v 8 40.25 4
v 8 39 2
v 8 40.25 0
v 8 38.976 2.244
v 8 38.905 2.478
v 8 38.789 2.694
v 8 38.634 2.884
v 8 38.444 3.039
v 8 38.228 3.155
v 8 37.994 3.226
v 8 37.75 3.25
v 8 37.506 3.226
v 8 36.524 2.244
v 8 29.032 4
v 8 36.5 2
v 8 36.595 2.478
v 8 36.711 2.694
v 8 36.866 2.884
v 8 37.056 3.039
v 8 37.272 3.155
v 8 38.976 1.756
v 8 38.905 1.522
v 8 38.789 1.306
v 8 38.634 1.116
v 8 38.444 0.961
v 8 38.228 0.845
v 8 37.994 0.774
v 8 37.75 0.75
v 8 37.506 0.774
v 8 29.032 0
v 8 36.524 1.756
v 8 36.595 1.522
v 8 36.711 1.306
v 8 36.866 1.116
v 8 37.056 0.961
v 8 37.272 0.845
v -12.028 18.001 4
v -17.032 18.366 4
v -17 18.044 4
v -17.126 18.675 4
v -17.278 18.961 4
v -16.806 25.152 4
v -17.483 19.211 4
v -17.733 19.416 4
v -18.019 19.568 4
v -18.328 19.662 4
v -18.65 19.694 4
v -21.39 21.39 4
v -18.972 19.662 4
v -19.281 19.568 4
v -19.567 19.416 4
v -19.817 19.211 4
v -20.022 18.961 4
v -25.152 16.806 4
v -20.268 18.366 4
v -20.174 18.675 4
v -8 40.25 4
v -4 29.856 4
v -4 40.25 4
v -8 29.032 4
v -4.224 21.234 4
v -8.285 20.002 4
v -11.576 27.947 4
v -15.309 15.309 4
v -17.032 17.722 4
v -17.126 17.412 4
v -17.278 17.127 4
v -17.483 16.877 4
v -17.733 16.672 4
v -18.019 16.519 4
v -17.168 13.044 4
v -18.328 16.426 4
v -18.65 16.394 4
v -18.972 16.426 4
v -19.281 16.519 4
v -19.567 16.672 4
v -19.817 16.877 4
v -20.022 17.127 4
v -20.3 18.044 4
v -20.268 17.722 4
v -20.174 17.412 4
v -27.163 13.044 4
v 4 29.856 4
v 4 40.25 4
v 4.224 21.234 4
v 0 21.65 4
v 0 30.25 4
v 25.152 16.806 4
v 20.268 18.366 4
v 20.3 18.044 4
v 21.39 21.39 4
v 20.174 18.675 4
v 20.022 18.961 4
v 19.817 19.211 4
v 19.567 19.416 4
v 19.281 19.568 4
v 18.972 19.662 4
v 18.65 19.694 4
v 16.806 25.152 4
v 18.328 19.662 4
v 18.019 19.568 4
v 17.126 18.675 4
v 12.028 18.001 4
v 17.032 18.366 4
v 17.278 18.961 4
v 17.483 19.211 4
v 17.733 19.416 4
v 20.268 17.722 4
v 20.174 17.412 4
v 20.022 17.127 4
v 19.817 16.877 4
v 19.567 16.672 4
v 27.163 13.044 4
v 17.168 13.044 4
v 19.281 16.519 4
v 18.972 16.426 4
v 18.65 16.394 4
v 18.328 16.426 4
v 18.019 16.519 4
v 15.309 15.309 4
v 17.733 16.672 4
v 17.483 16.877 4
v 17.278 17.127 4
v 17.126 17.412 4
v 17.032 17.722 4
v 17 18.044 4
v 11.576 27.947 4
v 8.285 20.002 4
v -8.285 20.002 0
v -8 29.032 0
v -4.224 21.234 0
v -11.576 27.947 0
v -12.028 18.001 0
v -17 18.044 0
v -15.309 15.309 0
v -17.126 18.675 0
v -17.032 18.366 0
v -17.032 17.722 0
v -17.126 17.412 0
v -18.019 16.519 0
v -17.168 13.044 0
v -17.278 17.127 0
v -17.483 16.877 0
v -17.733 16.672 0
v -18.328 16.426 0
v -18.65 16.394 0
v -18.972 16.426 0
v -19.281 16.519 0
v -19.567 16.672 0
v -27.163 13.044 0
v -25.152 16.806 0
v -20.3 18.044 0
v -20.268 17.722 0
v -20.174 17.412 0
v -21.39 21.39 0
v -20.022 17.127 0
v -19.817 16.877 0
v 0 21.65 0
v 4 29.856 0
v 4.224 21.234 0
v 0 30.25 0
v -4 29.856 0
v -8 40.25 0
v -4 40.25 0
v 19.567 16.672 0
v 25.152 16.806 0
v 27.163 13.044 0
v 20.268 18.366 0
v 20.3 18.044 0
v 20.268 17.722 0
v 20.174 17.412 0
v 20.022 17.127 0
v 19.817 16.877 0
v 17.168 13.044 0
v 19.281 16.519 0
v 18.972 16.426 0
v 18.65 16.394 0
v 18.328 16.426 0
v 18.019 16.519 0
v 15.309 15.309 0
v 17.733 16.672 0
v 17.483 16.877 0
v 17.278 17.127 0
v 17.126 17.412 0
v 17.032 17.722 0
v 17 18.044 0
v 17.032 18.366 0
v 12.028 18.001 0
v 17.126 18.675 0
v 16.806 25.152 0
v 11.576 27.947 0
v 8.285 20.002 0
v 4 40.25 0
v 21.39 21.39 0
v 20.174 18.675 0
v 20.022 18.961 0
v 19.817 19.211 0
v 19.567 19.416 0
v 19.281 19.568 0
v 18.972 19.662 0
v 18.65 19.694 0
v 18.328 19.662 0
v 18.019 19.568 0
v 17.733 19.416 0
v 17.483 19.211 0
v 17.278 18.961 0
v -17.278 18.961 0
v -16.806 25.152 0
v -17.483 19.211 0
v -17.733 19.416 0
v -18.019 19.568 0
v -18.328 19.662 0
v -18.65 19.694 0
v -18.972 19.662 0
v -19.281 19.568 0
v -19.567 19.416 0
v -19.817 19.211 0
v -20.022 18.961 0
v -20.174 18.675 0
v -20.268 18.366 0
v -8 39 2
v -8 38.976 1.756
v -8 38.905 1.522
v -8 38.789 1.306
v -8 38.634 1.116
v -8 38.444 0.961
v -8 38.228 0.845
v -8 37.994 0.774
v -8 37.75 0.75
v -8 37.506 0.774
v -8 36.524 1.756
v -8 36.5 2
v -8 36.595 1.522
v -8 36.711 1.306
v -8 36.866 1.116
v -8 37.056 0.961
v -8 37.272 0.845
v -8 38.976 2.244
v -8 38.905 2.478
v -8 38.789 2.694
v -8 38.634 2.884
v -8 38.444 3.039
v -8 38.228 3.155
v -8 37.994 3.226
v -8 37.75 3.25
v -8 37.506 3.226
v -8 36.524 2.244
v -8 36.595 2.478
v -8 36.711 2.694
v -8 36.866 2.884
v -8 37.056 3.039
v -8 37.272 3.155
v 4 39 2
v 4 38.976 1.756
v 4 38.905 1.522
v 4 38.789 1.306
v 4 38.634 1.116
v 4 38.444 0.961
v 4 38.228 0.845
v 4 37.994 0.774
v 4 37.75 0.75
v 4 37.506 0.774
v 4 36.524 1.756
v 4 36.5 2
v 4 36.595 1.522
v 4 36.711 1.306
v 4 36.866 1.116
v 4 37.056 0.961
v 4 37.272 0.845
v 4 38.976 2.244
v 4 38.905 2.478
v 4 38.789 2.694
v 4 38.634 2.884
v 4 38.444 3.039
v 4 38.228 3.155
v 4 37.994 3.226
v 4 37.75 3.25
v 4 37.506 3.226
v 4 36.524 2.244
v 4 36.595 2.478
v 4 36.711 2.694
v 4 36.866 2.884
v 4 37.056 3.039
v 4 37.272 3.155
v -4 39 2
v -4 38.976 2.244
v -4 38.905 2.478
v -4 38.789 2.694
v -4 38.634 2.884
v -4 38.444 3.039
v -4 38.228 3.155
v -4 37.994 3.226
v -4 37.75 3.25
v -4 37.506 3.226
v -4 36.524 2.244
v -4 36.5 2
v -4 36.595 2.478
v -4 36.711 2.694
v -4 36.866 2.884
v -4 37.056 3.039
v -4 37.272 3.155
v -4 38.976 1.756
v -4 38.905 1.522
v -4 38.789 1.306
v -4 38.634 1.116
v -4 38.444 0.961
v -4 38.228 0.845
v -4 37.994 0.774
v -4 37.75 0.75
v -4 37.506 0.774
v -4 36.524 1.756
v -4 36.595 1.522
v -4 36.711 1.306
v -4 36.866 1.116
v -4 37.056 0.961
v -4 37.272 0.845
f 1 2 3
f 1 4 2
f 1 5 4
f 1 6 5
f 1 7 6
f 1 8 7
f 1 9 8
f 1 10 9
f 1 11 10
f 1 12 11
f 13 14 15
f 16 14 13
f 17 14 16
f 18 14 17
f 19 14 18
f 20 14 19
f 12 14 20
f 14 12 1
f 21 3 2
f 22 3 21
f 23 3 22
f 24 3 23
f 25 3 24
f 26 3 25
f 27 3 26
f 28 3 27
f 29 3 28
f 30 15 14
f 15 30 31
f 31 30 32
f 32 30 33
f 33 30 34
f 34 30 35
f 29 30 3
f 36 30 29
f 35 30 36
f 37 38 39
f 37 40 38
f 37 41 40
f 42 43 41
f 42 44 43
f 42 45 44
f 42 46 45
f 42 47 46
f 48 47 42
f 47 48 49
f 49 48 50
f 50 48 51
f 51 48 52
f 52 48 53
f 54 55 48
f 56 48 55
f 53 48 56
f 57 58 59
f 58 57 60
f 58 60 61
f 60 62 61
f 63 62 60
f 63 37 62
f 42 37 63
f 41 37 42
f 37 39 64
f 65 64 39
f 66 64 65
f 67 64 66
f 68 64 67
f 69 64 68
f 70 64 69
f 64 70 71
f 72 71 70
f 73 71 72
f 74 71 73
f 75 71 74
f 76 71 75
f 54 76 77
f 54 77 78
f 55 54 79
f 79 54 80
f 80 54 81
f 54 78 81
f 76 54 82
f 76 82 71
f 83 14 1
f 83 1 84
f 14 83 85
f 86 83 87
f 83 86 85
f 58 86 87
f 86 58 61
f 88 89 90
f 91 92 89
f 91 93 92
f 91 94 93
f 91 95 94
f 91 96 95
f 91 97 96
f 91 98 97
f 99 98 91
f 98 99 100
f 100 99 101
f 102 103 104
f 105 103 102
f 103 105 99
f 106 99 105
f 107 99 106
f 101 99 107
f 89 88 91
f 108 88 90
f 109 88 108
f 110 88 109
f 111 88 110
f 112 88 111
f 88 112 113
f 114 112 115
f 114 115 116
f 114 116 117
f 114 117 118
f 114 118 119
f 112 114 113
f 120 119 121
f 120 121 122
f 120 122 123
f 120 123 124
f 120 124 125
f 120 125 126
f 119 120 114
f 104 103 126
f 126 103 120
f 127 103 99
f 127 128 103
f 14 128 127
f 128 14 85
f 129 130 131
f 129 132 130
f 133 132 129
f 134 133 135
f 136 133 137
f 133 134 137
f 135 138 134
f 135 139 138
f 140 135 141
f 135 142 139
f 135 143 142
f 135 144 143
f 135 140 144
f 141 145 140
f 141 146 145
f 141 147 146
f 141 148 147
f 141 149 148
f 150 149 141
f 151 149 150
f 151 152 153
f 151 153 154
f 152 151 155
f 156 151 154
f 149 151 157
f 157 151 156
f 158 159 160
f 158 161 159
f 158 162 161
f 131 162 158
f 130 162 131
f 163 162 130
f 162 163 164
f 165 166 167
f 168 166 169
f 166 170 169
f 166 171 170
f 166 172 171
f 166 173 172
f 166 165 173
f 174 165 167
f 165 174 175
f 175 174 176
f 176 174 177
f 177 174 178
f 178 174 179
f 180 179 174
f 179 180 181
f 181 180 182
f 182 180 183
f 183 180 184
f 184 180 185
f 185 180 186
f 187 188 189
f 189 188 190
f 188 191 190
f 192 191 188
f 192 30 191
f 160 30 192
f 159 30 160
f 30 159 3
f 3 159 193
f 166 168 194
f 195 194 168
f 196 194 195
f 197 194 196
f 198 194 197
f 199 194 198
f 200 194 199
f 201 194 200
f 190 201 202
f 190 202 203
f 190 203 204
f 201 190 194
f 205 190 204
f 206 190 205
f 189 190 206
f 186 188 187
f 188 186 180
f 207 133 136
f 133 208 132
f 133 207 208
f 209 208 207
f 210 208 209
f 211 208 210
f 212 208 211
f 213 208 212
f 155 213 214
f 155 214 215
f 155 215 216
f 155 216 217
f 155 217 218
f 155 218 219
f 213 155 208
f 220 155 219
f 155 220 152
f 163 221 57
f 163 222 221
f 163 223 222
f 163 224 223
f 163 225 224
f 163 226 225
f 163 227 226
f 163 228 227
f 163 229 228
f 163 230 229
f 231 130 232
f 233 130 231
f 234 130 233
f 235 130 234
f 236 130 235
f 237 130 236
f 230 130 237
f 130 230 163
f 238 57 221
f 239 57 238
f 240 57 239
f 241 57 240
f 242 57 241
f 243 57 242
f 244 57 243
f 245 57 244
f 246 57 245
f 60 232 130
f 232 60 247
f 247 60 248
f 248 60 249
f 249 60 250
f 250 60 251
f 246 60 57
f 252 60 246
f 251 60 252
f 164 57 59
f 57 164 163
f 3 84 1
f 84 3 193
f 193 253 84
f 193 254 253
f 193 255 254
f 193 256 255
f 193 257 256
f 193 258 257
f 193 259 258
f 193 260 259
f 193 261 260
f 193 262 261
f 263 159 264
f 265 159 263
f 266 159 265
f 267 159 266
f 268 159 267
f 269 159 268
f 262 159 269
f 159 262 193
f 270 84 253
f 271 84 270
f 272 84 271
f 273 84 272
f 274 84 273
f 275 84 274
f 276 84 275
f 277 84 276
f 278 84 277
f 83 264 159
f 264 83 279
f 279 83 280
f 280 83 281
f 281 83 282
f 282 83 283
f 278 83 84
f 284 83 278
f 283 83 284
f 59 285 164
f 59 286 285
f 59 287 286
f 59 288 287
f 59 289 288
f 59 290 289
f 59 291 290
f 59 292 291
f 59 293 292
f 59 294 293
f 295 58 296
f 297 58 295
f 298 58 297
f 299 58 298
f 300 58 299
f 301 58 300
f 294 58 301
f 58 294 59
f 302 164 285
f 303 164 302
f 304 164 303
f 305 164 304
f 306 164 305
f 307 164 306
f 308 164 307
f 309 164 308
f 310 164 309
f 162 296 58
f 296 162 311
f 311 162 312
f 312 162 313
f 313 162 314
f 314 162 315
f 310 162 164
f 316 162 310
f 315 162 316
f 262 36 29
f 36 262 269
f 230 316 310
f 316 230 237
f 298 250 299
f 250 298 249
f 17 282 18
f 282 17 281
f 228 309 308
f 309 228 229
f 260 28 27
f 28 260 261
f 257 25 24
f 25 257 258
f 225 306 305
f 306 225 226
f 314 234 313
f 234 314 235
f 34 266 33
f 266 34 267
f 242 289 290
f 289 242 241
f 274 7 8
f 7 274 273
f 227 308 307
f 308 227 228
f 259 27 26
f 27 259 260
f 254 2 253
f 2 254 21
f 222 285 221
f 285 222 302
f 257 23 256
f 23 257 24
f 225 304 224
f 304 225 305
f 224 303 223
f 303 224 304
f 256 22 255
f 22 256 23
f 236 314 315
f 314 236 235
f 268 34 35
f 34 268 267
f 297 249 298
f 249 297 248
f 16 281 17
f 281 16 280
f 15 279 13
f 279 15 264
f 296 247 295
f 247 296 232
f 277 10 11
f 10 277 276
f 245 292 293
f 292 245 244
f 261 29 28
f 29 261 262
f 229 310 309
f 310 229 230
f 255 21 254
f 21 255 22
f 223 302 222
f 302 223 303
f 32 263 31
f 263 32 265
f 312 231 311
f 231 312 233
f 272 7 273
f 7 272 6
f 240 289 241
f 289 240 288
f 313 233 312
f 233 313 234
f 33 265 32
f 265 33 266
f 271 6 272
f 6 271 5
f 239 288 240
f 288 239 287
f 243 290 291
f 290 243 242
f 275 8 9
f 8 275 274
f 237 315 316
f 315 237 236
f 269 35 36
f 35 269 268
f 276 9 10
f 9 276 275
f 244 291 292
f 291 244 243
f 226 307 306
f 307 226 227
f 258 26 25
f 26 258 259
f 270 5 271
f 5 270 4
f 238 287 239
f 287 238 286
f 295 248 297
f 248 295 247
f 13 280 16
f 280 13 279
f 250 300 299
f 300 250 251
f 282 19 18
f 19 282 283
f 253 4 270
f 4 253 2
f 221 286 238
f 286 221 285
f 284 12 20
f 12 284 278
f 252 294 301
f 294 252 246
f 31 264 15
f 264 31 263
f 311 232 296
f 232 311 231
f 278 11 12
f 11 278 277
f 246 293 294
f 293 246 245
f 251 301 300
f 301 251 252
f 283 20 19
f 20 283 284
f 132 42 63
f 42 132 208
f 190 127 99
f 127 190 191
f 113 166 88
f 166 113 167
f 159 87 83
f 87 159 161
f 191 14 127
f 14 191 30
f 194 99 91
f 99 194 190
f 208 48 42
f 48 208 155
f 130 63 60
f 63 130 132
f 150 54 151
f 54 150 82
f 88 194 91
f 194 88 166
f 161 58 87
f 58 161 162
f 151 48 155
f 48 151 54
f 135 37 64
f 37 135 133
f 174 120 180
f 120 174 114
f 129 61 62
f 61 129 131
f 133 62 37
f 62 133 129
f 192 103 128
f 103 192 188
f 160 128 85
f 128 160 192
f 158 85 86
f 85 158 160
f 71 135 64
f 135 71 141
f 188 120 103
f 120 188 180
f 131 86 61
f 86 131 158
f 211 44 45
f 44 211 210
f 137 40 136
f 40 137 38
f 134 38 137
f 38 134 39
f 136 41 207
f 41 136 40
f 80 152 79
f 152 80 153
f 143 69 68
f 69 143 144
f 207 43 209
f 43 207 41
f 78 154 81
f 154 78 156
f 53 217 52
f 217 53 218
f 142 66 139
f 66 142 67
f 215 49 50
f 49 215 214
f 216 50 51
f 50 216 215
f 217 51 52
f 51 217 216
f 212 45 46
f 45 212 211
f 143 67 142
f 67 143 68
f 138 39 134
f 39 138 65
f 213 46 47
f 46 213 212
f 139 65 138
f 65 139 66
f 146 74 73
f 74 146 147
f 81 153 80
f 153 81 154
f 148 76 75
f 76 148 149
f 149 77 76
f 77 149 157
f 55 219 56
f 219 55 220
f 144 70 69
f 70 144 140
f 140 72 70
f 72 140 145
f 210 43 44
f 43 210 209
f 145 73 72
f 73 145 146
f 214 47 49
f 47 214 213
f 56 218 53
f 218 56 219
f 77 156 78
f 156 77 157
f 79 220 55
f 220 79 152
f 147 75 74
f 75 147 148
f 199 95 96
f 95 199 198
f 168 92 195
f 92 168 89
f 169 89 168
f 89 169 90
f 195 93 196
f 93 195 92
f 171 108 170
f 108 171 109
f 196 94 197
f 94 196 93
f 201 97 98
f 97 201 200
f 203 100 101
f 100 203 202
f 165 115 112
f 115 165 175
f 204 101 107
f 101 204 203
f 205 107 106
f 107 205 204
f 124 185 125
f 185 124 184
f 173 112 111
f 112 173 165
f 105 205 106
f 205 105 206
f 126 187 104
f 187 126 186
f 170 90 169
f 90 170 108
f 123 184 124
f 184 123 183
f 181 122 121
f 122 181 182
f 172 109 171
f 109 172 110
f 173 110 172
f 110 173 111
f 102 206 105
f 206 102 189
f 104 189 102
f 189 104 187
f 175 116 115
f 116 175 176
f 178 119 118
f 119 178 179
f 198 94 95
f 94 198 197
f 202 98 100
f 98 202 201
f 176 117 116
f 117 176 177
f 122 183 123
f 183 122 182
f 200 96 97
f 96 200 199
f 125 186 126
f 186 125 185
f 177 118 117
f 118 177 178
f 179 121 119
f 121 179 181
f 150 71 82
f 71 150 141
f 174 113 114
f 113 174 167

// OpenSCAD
$fn = 32;

hole_w = 8;
screw = 2.5;
fan_d1 = 43.3;
fan_d2 = 60.5;
fan_screw_d = 3.3;
fan_screws_outer_length = 40.6;

thickness = 4;


fan_screw_x = (fan_screws_outer_length - fan_screw_d) / 2;

fan_inner_d = fan_d1 + (fan_d2 - fan_d1) / 2;
fan_screw_y = sqrt(pow(fan_inner_d / 2, 2) - pow(fan_screw_x, 2));
    
w = hole_w + thickness * 2;
dx = (fan_d2 - fan_d1) / 2;
h = 10 + dx;

mount();
fan_holder();

module mount() {
    difference() {
        translate([-w / 2, fan_d2 / 2 - dx, 0])
            cube([w, h, thickness]);
        translate([-hole_w / 2, fan_d2 / 2 - dx, 0])
            cube([hole_w, h, thickness]);
        translate([-w / 2, fan_d2 / 2 + h - screw - dx, thickness / 2])
            rotate([0, 90, 0])
                cylinder(d = screw, h = w);
    }
}

module fan_holder() {
    difference() {
        difference() {
            cylinder(d = fan_d2, h = thickness);
            cylinder(d = fan_d1, h = thickness);
        }

        translate([-fan_screw_x, fan_screw_y, 0]) 
            cylinder(d = fan_screw_d, h = thickness);    
        translate([fan_screw_x, fan_screw_y, 0])
                cylinder(d = fan_screw_d, h = thickness);

        translate([-fan_d2 / 2, -fan_d2 + fan_screw_y - screw * 2, 0])
            cube([fan_d2, fan_d2, thickness]);
    }
}
